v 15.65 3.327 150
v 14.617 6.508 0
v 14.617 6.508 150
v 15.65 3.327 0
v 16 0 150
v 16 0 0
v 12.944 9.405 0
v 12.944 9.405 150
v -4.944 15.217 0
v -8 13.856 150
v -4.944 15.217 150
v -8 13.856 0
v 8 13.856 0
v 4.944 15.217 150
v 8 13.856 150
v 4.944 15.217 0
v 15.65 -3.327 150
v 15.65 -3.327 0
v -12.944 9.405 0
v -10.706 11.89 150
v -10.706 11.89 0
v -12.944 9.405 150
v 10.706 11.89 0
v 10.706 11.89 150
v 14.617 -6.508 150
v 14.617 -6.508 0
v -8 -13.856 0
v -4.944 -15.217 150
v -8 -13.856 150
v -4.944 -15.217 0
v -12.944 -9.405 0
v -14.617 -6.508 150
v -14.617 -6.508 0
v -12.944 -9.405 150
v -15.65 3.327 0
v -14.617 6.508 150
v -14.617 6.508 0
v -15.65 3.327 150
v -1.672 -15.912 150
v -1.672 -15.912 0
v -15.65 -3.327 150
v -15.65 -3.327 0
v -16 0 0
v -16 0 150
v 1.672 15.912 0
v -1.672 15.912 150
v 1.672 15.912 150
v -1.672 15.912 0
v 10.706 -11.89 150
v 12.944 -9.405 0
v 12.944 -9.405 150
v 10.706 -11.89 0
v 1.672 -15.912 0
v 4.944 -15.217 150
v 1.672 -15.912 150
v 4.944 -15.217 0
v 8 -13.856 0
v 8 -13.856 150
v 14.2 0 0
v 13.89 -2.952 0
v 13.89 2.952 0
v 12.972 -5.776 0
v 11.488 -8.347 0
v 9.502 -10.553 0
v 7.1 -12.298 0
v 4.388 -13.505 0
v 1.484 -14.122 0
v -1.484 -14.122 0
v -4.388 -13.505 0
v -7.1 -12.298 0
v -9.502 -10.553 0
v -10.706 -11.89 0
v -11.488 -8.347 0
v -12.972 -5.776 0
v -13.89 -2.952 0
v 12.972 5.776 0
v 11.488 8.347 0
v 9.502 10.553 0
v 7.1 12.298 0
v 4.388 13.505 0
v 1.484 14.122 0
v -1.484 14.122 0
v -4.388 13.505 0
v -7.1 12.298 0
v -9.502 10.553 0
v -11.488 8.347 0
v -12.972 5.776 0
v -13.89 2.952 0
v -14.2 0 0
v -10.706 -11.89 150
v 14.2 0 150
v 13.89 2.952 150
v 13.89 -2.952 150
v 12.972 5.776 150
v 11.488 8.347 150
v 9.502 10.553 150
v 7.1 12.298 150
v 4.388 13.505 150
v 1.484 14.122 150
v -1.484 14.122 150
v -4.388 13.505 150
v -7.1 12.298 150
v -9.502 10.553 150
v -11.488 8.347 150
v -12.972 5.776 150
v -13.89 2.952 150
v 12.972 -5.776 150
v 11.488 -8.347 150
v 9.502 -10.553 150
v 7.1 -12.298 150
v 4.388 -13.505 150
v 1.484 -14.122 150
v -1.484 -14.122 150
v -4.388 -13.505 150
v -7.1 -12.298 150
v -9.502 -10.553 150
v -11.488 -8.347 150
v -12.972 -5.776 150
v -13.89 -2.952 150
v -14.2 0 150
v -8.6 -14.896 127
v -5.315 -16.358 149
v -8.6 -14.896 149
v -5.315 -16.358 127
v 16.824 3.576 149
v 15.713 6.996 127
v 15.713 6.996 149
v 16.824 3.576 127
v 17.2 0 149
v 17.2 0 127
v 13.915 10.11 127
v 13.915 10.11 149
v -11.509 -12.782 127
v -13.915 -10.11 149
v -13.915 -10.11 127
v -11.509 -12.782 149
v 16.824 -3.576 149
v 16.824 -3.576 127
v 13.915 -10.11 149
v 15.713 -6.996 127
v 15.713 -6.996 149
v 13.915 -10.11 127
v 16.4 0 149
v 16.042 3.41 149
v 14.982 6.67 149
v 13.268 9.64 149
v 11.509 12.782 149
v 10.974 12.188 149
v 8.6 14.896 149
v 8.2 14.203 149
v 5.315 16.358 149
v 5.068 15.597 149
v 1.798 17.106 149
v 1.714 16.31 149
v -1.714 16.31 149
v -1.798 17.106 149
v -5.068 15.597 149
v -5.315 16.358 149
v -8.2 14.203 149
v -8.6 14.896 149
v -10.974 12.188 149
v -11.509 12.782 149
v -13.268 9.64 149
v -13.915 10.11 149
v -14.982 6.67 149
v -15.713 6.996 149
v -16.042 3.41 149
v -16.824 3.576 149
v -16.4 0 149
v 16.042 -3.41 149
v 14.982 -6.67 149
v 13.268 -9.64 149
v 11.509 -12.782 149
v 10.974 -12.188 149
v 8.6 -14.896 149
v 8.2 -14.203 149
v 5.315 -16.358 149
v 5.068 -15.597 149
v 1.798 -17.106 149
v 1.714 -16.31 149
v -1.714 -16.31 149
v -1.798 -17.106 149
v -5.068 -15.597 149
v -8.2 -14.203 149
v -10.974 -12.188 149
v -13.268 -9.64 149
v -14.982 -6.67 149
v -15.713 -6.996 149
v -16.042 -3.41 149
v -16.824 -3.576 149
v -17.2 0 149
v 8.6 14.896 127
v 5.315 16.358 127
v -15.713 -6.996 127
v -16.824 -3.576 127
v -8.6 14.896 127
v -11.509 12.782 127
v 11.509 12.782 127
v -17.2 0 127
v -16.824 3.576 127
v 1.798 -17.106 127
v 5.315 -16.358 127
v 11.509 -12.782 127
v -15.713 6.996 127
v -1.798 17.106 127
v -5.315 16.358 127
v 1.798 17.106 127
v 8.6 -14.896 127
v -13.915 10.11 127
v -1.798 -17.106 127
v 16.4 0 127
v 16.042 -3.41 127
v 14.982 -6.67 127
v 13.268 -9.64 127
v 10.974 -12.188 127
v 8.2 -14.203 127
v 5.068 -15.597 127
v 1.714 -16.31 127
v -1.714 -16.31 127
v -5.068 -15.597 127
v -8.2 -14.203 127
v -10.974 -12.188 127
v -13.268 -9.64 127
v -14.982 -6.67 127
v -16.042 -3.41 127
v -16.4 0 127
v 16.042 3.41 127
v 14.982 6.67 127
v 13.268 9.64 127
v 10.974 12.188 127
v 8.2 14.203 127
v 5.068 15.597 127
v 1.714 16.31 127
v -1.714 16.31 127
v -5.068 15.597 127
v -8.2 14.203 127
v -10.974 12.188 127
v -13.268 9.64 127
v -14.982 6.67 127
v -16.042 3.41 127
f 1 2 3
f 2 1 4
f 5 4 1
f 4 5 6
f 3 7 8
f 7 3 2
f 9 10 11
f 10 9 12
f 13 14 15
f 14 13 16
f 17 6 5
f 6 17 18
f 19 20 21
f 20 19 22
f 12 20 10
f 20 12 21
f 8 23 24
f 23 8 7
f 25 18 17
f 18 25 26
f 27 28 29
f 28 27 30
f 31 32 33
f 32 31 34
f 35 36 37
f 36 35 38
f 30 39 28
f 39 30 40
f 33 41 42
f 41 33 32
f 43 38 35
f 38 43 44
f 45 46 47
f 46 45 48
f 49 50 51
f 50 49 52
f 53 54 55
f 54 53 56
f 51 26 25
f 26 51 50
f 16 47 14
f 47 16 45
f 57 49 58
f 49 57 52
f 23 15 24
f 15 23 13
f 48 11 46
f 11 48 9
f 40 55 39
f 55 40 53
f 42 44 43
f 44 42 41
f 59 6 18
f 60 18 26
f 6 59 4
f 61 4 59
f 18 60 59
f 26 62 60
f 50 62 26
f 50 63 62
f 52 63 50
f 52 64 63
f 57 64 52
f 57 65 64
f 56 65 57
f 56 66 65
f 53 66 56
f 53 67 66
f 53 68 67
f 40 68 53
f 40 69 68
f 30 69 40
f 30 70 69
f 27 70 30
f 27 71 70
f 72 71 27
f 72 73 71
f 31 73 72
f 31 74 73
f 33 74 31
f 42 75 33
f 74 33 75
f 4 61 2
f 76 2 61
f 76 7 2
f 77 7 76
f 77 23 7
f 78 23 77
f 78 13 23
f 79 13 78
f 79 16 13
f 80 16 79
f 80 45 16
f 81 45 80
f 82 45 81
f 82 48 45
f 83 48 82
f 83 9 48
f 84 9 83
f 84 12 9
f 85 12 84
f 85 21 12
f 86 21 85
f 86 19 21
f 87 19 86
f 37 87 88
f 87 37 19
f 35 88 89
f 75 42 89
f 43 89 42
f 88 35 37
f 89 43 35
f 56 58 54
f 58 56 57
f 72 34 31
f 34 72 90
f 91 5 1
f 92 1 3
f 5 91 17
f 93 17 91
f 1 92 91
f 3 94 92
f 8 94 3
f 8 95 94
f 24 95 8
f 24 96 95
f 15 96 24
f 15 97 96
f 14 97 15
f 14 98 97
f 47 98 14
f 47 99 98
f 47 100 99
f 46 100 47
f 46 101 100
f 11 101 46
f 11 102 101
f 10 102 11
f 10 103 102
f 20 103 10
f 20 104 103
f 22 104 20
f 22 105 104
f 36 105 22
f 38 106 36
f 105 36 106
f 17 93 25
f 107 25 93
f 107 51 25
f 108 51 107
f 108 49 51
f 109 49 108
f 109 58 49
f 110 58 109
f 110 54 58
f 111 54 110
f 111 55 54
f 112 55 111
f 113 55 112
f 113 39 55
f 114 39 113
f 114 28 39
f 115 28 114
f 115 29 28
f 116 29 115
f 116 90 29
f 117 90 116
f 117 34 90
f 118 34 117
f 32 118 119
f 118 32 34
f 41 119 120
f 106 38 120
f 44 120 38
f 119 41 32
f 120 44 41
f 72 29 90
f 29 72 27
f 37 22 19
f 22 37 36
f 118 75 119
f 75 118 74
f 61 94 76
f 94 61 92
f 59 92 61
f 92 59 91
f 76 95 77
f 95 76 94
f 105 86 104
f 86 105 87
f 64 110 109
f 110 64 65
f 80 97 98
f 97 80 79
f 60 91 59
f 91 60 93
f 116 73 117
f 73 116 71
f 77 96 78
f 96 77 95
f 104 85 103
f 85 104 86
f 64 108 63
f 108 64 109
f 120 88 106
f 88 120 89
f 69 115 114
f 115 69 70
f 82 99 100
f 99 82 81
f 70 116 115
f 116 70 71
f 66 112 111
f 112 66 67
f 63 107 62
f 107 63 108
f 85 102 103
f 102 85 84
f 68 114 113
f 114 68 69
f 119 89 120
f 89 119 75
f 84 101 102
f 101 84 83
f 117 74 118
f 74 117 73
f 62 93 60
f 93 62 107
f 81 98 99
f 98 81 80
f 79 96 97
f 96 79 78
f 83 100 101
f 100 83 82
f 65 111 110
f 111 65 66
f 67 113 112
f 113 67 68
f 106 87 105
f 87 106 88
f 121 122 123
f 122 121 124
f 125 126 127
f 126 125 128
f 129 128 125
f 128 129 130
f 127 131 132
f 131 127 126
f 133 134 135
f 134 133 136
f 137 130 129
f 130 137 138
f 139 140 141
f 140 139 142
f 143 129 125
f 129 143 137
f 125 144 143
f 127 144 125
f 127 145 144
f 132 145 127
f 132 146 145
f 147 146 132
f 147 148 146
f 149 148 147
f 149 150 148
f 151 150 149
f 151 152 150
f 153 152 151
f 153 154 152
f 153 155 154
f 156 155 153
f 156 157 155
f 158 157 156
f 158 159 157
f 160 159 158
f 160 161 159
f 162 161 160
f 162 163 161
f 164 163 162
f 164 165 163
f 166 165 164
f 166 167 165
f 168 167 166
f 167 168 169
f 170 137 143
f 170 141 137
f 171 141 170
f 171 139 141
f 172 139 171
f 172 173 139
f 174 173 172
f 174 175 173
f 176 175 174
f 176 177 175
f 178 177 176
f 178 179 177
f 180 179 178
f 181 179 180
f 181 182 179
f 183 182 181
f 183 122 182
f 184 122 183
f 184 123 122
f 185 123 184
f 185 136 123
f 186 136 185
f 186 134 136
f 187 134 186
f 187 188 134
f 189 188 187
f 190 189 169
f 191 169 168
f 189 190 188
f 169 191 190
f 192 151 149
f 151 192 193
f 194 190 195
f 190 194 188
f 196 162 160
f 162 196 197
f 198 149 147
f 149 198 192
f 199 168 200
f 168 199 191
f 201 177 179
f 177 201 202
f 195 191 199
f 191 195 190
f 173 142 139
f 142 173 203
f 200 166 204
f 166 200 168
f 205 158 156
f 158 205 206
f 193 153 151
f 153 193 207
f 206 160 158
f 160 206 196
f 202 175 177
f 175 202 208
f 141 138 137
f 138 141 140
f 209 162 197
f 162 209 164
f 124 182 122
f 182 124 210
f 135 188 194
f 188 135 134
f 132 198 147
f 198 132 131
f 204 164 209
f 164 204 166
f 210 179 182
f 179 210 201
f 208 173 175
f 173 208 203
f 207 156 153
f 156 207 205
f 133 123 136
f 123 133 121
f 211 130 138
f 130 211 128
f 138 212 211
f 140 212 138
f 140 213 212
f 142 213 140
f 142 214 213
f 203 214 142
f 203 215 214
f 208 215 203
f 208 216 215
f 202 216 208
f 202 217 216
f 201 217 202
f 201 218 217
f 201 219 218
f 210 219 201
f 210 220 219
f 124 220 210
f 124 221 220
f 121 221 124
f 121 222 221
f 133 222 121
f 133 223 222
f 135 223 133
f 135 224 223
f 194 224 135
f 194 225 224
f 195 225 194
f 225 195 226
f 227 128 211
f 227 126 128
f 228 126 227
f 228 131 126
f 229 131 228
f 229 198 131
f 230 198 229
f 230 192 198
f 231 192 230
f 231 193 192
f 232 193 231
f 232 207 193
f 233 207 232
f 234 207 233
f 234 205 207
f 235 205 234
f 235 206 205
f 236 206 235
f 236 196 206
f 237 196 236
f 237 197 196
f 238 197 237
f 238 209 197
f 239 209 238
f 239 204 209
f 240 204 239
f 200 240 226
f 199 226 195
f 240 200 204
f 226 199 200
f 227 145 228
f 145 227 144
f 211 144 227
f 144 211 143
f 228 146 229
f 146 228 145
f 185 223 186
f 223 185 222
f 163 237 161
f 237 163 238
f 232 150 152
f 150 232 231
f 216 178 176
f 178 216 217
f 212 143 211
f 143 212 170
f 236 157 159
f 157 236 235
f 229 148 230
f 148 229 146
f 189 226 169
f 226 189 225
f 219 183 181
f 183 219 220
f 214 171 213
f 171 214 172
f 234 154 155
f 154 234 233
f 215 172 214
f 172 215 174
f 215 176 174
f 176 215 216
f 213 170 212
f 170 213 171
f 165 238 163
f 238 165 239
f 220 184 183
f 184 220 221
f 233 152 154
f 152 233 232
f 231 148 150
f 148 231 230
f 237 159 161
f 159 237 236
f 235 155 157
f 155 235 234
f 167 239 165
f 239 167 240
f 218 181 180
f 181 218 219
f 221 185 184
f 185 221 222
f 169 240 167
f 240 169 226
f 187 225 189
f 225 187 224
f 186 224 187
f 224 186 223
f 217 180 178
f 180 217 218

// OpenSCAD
// Parameters
length_mm = 150; //[75:300:1]
include_end_fitting = 1; //[0:1:1]
ht32_outer_diameter = 32; //[28:40:0.5]
wall_thickness = 1.8; //[1.0:3.0:0.1]
fit_overlap = 1; //[0.5:2:0.1]
socket_length = 22; //[12:40:1]
socket_wall_extra = 1.2; //[0.5:3:0.1]
socket_inner_clearance = 0.4; //[0.1:1.0:0.05]
stop_ring_length = 3; //[1:8:0.5]
stop_ring_thickness = 1.2; //[0.5:3:0.1]
chamfer_length = 2; //[0.5:6:0.5]

// Module for HT Pipe
module ht_pipe() {
  color([0.85, 0.85, 0.8]) {
    // Main pipe segment
    difference() {
      cylinder(h=length_mm, r=ht32_outer_diameter/2, center=false);
      translate([0, 0, 0])
        cylinder(h=length_mm, r=ht32_outer_diameter/2 - wall_thickness, center=false);
    }
    
    if (include_end_fitting) {
      // End fitting
      difference() {
        translate([0, 0, length_mm - socket_length - fit_overlap])
          cylinder(h=socket_length, r=ht32_outer_diameter/2 + socket_wall_extra, center=false);
        
        translate([0, 0, length_mm - socket_length - fit_overlap])
          cylinder(h=socket_length, r=ht32_outer_diameter/2 + socket_inner_clearance, center=false);
        
        translate([0, 0, length_mm - socket_length - fit_overlap])
          cylinder(h=stop_ring_length, r=ht32_outer_diameter/2 + socket_inner_clearance - stop_ring_thickness, center=false);
        
        translate([0, 0, length_mm - fit_overlap])
          cylinder(h=chamfer_length, r1=ht32_outer_diameter/2 + socket_inner_clearance, r2=0, center=false);
      }
    }
  }
}

// Assembly
module assembly() {
  ht_pipe();
}

assembly();
